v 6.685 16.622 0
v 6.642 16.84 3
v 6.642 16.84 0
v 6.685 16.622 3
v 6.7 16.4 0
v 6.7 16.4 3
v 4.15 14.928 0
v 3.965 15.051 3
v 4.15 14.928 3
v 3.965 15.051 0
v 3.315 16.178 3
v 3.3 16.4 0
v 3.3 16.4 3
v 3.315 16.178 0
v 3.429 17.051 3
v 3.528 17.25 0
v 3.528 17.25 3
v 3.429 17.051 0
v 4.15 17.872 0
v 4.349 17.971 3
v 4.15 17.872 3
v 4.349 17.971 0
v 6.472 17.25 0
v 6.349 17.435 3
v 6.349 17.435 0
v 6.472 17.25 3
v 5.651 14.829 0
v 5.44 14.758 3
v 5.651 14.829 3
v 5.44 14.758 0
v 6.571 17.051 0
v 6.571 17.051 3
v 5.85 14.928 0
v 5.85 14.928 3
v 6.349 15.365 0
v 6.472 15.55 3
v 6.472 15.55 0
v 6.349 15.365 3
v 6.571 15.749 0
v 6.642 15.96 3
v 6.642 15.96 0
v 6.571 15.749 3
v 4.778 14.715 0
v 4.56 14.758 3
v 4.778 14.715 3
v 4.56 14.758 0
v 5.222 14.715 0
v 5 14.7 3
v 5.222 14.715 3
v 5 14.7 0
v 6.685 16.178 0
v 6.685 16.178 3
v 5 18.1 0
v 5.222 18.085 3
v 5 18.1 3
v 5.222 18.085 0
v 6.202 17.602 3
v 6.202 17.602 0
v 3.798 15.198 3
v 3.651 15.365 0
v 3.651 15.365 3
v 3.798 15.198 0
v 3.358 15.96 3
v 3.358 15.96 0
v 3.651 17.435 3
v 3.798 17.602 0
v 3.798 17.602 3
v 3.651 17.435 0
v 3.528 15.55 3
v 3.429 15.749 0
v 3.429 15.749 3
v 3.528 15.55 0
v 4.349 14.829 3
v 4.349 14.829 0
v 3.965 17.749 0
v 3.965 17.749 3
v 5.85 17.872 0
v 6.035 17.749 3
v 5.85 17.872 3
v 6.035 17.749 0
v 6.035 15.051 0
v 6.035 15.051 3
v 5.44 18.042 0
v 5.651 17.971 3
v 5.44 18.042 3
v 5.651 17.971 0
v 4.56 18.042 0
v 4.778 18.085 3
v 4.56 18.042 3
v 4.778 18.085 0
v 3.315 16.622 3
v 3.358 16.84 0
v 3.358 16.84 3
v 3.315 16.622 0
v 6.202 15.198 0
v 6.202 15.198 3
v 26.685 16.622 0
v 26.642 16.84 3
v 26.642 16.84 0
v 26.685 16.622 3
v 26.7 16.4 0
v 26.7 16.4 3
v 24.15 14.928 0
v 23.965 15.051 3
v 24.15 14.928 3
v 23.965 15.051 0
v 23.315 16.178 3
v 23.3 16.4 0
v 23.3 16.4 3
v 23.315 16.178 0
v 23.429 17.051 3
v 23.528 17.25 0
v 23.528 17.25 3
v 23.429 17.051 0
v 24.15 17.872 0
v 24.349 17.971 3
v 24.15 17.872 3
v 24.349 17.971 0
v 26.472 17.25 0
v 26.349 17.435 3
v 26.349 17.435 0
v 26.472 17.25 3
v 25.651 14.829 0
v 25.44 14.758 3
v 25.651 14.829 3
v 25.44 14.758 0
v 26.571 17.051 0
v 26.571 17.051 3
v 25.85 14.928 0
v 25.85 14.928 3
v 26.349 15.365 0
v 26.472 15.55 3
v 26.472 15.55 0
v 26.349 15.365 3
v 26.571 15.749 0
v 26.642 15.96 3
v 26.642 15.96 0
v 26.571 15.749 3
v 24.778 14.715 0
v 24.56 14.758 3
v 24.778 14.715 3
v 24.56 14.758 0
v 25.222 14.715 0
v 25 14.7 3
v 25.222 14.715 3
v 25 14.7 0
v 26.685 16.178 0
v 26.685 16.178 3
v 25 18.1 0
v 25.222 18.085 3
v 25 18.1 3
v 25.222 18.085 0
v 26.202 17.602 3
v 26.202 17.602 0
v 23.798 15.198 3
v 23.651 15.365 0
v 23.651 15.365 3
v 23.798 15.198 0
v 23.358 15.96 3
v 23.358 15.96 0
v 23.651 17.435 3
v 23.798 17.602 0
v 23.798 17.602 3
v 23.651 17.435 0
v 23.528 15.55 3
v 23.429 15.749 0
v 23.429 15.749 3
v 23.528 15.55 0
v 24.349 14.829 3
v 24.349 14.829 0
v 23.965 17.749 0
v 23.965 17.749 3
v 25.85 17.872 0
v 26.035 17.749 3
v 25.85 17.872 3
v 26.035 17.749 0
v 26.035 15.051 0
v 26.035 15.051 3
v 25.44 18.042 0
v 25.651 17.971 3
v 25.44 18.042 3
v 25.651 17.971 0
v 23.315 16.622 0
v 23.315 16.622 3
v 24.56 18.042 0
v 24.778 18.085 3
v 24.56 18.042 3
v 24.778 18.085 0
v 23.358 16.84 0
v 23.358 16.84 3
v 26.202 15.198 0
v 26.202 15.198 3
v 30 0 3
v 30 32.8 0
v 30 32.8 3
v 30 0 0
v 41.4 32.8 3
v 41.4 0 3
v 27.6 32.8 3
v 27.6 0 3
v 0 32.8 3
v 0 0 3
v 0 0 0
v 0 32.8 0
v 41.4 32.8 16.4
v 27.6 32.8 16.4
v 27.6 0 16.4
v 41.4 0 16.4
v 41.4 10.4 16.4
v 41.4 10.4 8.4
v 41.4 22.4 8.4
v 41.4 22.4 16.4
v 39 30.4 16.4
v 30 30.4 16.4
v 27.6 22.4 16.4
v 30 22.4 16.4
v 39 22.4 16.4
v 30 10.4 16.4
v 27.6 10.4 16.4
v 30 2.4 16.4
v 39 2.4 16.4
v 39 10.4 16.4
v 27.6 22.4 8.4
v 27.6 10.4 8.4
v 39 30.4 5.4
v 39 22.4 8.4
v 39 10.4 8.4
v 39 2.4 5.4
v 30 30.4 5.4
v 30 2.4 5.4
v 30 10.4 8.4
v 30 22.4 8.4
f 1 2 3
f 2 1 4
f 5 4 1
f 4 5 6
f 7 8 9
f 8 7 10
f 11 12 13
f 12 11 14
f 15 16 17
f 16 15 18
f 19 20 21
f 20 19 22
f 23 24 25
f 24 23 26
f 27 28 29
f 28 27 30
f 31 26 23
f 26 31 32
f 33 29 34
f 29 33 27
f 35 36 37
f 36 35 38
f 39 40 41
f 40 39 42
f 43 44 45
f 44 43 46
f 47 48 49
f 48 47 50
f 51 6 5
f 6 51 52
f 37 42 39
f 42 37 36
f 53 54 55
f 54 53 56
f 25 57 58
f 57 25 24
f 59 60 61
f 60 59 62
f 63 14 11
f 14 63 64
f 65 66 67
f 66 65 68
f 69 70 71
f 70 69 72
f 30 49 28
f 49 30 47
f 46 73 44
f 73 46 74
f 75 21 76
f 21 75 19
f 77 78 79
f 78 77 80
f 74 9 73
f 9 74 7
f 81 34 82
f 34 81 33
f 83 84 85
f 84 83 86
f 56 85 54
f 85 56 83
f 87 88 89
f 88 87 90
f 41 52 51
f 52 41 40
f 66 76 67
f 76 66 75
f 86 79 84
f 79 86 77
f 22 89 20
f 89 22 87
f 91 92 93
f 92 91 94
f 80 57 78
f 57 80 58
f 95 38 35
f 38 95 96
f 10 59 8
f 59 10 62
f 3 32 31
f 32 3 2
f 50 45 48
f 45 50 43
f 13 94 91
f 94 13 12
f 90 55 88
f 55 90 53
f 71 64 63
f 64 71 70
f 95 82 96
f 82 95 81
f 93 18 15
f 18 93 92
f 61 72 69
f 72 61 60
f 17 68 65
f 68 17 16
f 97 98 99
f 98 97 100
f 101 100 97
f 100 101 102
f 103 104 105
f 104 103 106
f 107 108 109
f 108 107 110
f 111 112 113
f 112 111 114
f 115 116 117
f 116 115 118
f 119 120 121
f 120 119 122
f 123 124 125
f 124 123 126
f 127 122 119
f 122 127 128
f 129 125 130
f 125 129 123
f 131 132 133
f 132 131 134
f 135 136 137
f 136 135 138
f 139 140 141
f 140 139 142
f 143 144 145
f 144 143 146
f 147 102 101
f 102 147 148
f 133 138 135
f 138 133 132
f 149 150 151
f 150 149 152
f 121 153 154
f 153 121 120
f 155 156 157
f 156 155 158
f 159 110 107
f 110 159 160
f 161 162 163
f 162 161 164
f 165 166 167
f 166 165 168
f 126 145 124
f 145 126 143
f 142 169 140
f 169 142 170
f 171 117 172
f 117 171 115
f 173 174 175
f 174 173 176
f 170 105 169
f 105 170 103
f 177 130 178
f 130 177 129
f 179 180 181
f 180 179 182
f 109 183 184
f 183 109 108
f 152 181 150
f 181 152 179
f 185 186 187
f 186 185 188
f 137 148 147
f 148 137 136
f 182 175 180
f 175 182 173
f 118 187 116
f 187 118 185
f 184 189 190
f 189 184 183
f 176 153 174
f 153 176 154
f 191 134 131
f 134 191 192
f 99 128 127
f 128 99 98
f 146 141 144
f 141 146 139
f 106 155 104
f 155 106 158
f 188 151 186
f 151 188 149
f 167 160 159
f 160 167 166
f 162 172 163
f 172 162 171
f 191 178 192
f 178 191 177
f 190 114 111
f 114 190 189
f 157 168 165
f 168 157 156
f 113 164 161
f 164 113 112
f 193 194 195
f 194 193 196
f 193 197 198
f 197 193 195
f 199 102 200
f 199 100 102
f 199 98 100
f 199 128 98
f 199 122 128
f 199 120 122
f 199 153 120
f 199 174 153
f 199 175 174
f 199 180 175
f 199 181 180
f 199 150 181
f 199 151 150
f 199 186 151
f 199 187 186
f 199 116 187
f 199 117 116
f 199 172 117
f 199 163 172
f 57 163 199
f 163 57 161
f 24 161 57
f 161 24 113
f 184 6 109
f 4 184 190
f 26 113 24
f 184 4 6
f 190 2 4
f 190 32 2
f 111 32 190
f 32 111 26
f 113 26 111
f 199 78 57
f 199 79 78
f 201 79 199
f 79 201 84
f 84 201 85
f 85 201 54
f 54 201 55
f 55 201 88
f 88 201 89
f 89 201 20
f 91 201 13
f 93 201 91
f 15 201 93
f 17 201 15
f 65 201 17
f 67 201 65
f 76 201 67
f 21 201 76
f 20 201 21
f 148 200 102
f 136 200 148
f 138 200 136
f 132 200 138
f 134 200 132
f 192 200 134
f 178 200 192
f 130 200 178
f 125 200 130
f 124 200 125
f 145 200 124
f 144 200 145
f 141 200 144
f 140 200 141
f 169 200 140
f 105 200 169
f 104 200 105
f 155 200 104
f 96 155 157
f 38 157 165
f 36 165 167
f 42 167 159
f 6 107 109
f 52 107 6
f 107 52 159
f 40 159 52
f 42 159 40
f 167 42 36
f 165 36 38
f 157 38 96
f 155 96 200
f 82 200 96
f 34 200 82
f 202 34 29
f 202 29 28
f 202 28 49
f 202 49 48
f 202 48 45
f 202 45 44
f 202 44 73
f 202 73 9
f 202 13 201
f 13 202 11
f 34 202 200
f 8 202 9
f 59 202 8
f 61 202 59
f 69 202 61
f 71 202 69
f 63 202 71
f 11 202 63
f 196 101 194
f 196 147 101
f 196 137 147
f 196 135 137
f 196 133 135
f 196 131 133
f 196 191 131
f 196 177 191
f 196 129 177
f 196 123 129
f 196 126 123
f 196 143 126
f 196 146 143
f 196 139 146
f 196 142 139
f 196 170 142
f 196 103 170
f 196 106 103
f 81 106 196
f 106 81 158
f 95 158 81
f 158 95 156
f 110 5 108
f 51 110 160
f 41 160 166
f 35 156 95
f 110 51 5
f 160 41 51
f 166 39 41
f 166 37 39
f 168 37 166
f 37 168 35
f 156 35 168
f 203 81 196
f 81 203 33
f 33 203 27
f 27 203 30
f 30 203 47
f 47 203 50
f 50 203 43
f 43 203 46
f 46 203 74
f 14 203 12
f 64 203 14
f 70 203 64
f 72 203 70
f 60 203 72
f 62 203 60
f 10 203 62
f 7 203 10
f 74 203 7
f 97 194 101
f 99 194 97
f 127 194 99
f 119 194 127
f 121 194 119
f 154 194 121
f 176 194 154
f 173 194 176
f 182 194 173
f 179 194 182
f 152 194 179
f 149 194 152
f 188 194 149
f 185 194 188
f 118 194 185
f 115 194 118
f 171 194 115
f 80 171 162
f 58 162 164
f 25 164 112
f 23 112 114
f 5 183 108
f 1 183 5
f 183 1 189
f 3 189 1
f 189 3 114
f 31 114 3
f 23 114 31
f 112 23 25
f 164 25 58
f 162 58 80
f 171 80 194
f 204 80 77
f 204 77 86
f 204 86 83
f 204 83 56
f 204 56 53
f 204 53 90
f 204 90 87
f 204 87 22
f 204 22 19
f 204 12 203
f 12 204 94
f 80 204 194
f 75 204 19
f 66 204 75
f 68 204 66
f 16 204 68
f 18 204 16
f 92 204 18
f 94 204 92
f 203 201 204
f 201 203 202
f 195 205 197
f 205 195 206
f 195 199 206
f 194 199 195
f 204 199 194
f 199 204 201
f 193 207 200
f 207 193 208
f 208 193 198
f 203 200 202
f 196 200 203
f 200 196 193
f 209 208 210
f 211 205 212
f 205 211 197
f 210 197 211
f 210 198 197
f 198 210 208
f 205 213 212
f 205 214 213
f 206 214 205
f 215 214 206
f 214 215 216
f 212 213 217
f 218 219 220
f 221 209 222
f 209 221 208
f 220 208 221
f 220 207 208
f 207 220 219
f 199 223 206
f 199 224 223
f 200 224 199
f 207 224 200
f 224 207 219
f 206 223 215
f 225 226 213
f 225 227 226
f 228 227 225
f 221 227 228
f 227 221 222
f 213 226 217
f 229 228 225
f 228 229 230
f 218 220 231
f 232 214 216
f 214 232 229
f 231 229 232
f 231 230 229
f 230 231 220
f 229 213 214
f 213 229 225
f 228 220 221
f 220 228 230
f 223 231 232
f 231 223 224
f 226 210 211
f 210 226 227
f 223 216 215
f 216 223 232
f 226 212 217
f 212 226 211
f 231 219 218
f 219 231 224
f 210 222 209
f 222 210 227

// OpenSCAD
// Kamera-Clip für den Roboterarm — alternatives "Kinder-Teil" zum Selberdrucken.
// Hält die kleine USB-Kamera an der drehenden Säule/Schulter (Auge dreht mit der Basis).
// Parametrisch: Maße an die eigene Kamera anpassen und mit OpenSCAD als STL exportieren.
//
//   openscad -o kamera_clip.stl kamera_clip.scad
//
// Druck: PLA, 0.2 mm, 20 % Infill, ohne Stützen (flach aufs Bett legen).

// ---- Parameter (mm) ----
kamera_breite   = 28;   // Breite der Kameraplatine/-fassung
kamera_dicke    = 9;    // Dicke der Kamera
wand            = 2.4;  // Wandstärke
lippe           = 2.0;  // Haltelippe vorn
platte_dicke    = 3.0;  // Montageplatte
platte_laenge   = 30;
schraubloch     = 3.4;  // M3 Durchgang
lochabstand     = 20;

$fn = 48;

module montageplatte() {
    difference() {
        cube([platte_laenge, kamera_breite + 2*wand, platte_dicke]);
        for (dx = [-1, 1])
            translate([platte_laenge/2 + dx*lochabstand/2,
                       (kamera_breite + 2*wand)/2, -1])
                cylinder(h = platte_dicke + 2, d = schraubloch);
    }
}

module halter() {
    // U-förmige Fassung für die Kamera
    aussen_b = kamera_breite + 2*wand;
    aussen_t = kamera_dicke + 2*wand;
    difference() {
        cube([aussen_t, aussen_b, kamera_dicke + wand + lippe]);
        translate([wand, wand, wand])
            cube([kamera_dicke, kamera_breite, kamera_dicke + lippe + 1]);
        // Fenster für die Linse
        translate([-1, aussen_b/2 - 6, wand + 3])
            cube([aussen_t + 2, 12, kamera_dicke]);
    }
}

union() {
    montageplatte();
    translate([platte_laenge - wand, 0, platte_dicke])
        halter();
}
